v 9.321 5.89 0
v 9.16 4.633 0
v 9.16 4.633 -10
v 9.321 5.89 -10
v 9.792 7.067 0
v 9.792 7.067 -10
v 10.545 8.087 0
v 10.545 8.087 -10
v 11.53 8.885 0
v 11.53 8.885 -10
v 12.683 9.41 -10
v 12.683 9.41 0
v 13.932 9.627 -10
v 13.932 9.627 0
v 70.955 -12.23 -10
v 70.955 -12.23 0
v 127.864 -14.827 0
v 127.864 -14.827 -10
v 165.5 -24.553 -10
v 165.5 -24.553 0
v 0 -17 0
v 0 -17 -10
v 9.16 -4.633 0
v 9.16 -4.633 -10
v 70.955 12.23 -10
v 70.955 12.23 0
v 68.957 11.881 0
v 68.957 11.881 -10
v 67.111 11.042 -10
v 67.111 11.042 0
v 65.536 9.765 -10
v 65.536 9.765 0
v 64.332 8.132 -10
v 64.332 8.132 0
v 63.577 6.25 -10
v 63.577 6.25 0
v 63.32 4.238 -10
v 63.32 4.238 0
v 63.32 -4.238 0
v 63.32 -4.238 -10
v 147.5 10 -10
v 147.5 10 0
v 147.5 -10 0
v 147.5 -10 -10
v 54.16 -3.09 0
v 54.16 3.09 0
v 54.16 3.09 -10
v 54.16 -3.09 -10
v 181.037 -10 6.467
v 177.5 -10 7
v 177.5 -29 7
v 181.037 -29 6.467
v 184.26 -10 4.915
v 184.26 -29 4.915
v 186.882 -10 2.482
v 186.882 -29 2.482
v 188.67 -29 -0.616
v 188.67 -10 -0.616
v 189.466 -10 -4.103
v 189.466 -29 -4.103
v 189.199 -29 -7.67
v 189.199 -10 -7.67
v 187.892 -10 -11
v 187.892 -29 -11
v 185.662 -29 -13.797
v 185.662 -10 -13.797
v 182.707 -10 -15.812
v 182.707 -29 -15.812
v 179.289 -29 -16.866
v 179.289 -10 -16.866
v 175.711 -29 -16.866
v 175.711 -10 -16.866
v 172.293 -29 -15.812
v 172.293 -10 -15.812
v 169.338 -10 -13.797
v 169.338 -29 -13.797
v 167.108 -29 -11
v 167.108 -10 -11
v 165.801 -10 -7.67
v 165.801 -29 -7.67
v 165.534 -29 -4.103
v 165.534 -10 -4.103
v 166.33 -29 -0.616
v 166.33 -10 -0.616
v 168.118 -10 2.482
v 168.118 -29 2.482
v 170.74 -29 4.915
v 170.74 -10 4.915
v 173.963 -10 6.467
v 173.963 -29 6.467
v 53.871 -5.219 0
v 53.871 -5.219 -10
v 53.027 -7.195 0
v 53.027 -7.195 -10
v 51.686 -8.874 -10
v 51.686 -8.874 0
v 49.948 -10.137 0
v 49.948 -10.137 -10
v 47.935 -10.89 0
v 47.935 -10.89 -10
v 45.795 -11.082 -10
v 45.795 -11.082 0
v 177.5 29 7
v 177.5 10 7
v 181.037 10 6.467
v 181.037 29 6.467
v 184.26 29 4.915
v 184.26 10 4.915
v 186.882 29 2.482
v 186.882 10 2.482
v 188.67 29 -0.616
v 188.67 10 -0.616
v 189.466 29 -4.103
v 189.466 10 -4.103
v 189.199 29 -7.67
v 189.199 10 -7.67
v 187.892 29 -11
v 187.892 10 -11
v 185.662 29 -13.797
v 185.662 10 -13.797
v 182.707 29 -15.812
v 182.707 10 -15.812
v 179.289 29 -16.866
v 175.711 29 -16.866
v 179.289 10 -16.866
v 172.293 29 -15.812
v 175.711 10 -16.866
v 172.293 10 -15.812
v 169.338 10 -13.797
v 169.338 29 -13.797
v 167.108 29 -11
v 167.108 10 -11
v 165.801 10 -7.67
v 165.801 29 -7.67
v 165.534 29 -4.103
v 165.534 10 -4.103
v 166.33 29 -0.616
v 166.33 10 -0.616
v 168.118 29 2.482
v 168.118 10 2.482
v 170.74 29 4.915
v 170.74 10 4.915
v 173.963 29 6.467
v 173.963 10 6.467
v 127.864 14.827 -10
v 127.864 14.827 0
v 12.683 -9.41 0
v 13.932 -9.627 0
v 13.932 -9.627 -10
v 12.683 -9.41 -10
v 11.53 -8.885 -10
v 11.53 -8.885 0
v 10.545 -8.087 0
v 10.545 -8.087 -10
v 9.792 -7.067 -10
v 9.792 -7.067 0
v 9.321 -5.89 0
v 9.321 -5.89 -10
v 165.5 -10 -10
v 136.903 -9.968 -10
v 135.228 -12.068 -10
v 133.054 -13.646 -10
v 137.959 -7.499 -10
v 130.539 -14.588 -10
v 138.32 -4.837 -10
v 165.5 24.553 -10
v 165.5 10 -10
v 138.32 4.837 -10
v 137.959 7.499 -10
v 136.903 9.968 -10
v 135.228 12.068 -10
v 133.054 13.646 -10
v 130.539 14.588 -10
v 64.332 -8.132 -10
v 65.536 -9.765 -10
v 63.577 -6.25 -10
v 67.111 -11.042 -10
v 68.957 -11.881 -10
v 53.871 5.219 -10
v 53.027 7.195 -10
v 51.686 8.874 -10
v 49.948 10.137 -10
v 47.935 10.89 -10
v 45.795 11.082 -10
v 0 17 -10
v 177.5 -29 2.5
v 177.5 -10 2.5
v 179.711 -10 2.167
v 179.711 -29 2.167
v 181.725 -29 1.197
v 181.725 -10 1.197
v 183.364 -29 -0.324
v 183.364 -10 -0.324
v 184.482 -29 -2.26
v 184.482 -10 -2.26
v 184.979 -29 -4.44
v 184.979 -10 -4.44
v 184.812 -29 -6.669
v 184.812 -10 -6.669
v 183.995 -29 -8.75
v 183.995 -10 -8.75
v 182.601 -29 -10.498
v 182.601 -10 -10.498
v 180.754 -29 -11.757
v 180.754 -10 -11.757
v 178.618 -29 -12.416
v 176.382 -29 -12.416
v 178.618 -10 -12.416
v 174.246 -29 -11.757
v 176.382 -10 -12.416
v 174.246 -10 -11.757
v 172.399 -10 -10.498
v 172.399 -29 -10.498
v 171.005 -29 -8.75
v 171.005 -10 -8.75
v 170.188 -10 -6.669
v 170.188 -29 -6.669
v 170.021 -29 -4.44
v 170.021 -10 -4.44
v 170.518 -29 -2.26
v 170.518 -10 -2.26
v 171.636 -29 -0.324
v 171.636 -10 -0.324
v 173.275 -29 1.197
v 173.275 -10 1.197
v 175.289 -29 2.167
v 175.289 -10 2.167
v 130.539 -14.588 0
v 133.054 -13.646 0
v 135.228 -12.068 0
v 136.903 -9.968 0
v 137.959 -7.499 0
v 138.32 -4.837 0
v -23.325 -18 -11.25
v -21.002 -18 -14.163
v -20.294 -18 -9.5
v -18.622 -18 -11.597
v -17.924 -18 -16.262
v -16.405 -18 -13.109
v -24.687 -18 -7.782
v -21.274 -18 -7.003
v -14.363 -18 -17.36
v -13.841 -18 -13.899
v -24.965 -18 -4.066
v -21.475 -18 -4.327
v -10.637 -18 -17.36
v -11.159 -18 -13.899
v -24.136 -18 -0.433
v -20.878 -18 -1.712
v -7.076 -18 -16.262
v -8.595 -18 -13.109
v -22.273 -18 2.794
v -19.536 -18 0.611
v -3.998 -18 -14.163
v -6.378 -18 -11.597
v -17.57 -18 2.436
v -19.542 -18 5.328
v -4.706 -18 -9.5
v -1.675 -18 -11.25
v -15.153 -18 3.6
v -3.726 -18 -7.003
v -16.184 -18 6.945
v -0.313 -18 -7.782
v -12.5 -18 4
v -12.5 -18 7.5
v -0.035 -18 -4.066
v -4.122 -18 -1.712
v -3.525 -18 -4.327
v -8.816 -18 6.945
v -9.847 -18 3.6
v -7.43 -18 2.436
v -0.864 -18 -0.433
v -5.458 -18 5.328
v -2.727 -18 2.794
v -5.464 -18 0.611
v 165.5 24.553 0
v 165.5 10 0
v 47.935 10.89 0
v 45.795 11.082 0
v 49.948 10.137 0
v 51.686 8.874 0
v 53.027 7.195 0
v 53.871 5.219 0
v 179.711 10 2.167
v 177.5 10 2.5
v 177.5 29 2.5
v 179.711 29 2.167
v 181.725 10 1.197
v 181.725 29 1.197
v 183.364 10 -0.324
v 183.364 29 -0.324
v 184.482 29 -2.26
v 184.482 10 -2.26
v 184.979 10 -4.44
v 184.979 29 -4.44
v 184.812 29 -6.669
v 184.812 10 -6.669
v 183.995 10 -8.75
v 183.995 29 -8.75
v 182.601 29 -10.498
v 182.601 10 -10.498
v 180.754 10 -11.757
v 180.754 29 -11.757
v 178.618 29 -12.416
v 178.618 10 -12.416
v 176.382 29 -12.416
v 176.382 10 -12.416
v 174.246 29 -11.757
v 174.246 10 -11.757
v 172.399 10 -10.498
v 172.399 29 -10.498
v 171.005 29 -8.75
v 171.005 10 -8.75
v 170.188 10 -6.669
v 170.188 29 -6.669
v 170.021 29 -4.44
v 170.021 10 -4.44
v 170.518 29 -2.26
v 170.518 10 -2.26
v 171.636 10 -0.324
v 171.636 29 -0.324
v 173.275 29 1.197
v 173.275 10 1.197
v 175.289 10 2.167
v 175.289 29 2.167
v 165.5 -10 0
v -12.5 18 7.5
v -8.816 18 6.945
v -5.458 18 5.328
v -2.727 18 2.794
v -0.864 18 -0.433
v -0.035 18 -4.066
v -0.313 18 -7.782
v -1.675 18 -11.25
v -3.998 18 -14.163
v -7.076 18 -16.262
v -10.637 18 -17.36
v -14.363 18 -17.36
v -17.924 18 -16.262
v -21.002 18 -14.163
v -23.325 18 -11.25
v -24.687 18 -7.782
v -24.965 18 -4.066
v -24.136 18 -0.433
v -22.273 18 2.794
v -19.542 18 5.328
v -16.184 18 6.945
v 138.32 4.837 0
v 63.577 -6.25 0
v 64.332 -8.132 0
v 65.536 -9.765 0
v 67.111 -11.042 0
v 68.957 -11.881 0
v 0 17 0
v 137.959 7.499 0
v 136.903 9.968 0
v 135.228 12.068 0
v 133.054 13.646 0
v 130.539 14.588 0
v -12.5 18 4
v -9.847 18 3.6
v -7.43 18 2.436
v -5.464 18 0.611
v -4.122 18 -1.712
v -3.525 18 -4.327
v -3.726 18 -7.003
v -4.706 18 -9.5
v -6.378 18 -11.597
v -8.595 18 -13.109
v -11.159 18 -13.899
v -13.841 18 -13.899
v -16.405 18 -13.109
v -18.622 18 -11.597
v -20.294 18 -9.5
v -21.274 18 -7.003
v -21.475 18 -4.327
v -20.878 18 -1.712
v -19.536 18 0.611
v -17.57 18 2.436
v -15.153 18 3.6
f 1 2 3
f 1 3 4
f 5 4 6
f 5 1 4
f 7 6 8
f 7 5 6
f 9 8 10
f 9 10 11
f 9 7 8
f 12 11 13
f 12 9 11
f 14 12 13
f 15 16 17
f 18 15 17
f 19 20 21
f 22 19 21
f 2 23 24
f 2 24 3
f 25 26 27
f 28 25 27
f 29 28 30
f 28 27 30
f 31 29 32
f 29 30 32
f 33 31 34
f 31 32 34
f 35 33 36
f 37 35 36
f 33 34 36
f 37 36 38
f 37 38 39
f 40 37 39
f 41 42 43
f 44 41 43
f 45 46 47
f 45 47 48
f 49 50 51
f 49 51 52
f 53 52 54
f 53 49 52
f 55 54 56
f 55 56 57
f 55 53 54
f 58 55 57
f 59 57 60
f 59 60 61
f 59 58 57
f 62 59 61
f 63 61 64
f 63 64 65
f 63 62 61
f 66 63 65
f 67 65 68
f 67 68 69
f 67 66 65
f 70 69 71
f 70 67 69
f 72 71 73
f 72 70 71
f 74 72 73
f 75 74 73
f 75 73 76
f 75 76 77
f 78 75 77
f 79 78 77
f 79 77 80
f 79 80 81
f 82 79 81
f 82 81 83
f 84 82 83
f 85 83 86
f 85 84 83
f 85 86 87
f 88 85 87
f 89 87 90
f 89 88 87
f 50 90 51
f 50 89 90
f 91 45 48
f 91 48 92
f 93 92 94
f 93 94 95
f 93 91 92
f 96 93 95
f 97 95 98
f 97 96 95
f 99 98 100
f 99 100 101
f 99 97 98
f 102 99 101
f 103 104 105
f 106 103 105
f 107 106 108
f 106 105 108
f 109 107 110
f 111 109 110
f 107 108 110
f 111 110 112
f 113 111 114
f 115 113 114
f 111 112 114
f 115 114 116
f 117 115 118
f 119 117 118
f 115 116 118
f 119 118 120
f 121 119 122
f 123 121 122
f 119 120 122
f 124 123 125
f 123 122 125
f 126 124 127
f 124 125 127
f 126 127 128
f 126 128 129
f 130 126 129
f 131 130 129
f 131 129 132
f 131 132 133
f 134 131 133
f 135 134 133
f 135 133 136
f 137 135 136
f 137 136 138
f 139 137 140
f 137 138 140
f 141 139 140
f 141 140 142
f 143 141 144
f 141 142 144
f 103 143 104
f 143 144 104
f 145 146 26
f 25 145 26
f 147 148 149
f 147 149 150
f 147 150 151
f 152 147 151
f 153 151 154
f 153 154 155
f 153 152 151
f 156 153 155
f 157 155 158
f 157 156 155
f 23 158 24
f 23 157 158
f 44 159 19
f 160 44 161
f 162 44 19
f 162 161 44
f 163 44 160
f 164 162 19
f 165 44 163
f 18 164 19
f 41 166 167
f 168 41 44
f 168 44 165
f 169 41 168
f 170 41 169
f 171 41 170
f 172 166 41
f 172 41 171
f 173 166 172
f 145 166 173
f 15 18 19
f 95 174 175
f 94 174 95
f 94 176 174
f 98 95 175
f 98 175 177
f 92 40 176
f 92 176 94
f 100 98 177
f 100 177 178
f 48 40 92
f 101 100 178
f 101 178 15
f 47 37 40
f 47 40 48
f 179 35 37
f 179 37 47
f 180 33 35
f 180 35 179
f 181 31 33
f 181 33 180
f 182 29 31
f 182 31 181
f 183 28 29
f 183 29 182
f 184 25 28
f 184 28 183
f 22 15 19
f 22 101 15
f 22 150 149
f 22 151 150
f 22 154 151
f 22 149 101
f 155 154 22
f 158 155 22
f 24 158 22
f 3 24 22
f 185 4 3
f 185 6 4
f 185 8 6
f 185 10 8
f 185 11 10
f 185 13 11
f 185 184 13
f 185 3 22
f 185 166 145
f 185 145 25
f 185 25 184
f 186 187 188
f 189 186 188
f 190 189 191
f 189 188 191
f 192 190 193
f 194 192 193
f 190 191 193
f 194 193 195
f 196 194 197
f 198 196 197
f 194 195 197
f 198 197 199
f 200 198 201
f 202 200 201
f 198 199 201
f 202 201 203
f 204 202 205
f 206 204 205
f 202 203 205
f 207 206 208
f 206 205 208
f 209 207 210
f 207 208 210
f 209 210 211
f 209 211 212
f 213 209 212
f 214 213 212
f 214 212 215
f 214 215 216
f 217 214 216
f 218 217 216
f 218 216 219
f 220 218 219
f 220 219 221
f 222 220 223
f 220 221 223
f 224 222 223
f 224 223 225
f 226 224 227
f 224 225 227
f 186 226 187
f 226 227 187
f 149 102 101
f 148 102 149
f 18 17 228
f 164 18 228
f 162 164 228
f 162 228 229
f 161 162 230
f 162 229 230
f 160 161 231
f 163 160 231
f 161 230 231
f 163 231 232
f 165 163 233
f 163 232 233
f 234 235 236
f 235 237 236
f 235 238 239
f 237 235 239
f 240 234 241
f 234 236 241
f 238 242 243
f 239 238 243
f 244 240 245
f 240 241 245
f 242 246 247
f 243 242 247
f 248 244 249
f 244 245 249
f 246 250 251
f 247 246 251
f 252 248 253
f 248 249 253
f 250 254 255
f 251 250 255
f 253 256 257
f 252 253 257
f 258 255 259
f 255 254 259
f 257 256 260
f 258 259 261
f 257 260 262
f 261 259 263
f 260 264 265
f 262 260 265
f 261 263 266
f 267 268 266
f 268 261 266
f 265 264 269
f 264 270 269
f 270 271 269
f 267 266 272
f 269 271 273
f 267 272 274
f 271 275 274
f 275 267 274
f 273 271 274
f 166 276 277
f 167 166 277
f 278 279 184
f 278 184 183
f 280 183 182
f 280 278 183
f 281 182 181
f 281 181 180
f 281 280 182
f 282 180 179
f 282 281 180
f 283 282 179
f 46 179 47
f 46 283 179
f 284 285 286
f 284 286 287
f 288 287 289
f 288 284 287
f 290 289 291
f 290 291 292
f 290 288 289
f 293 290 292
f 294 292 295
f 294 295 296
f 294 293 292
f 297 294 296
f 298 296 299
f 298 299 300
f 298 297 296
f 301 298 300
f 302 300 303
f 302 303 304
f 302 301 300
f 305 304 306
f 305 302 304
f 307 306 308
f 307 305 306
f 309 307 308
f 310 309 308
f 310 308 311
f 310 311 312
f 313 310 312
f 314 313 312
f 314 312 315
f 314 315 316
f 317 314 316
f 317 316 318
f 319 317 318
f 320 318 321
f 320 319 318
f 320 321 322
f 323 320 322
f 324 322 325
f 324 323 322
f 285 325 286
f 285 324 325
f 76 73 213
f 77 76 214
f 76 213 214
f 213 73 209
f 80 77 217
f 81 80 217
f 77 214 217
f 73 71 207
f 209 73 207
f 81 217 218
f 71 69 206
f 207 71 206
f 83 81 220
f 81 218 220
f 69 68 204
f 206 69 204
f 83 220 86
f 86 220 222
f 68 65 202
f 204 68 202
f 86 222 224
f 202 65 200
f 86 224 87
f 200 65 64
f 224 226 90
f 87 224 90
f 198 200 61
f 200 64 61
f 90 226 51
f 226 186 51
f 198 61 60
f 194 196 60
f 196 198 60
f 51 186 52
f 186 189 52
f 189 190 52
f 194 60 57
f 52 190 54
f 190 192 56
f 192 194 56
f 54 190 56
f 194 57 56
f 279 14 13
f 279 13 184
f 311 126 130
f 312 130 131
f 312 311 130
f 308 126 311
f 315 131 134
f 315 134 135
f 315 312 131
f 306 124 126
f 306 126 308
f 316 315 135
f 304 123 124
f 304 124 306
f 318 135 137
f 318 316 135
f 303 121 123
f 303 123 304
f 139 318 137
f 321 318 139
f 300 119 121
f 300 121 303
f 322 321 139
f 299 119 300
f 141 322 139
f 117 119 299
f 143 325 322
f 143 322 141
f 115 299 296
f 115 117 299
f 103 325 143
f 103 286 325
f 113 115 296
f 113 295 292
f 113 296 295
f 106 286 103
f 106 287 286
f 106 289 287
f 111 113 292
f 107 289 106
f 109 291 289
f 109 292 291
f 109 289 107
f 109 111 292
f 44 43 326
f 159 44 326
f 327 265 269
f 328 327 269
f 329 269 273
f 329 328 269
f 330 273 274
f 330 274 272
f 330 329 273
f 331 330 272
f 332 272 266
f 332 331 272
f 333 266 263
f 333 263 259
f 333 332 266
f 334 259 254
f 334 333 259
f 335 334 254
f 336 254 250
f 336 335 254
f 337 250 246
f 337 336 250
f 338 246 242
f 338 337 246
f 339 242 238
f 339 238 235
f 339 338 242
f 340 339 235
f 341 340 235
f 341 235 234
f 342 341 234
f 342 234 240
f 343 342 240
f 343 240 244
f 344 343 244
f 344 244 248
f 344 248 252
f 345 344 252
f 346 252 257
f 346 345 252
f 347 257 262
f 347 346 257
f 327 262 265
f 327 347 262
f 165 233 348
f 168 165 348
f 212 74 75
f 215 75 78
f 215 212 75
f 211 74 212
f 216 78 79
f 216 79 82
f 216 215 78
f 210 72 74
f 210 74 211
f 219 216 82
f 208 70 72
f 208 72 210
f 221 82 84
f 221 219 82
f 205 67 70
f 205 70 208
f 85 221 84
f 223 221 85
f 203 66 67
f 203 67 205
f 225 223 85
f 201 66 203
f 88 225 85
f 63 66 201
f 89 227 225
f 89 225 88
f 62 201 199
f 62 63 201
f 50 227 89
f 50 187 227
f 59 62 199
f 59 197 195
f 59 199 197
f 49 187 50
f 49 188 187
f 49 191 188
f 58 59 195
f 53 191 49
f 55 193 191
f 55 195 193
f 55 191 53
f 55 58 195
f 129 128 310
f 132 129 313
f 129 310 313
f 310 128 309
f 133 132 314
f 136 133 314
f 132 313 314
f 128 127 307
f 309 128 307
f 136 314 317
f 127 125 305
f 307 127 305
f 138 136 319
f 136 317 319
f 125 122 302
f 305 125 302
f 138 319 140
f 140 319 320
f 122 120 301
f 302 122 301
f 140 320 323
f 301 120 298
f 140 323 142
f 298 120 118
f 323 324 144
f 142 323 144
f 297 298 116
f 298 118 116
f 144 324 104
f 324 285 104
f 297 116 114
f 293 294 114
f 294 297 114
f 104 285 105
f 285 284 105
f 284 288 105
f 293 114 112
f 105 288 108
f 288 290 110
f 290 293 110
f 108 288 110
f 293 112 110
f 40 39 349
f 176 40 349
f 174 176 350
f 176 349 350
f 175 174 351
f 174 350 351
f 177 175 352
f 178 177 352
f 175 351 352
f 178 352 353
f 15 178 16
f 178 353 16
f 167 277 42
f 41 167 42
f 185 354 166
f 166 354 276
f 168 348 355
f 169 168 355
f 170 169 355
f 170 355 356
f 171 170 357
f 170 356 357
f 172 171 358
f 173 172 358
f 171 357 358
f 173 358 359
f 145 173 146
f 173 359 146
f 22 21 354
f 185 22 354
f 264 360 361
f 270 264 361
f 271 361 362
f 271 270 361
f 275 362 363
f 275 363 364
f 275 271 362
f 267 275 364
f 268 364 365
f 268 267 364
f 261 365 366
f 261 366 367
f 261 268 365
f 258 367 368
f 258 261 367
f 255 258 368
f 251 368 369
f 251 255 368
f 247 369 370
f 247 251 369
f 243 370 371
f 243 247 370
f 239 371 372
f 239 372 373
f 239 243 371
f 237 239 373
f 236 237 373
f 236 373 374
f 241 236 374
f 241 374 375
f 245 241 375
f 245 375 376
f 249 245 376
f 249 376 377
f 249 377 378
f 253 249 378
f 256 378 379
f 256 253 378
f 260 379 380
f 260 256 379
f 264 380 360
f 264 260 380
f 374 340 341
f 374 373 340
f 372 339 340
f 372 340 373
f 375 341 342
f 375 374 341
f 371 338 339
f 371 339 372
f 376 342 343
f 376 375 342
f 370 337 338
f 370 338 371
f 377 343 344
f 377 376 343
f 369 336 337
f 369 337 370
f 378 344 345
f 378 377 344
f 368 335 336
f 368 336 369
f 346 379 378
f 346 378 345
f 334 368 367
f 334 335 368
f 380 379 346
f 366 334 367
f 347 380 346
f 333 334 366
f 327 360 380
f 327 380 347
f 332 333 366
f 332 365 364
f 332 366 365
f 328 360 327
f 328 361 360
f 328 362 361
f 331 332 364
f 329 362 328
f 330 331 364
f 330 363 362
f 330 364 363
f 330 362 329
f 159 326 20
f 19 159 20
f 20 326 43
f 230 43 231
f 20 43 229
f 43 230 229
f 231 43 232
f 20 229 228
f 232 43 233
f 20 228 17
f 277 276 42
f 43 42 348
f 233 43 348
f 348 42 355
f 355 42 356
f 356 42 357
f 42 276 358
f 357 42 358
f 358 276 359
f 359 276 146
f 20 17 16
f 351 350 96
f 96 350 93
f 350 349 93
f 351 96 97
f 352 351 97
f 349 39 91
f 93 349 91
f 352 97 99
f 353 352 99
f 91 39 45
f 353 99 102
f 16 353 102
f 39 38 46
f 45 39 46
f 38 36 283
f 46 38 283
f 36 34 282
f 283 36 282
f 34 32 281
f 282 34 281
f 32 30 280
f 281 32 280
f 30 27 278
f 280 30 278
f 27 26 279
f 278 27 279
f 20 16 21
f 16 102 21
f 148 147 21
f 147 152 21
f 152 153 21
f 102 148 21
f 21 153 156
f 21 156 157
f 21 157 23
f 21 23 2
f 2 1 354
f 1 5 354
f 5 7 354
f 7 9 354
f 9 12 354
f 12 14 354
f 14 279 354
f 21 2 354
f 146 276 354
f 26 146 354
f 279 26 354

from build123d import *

# Parameters (mm, degrees)
BOSS_EXTRUDE1_DEPTH = 10
SKETCH2_R           = 12.5
SKETCH2_R_2         = 9
BOSS_EXTRUDE2_DEPTH = 18
SKETCH3_R           = 12
SKETCH3_R_2         = 7.5
BOSS_EXTRUDE3_DEPTH = 19


with BuildPart() as part:
    # Sketch1 → Boss-Extrude1 (new body)
    with BuildSketch(Plane.XY):
        Polygon((165.5, -24.552818182), (0, -17), (0, 17), (165.5, 24.552818182), (165.5, 10), (147.5, 10), (147.5, -10), (165.5, -10), align=None)
        with BuildLine():
            ThreePointArc((138.32, 4.837323832), (135.228006533, 12.067776497), (127.864110852, 14.826926681))
            Line((127.864110852, 14.826926681), (70.955288681, 12.229814978))
            ThreePointArc((70.955288681, 12.229814978), (65.535637868, 9.764537925), (63.32, 4.238132699))
            Line((63.32, 4.238132699), (63.32, -4.238132699))
            ThreePointArc((63.32, -4.238132699), (65.535637868, -9.764537925), (70.955288681, -12.229814978))
            Line((70.955288681, -12.229814978), (127.864110852, -14.826926681))
            ThreePointArc((127.864110852, -14.826926681), (135.228006533, -12.067776497), (138.32, -4.837323832))
            Line((138.32, -4.837323832), (138.32, 4.837323832))
        make_face(mode=Mode.SUBTRACT)
        with BuildLine():
            Line((9.16, 0), (9.16, 4.632680545))
            ThreePointArc((9.16, 4.632680545), (10.544773667, 8.086683812), (13.932055426, 9.62748197))
            Line((13.932055426, 9.62748197), (45.795288681, 11.081604069))
            ThreePointArc((45.795288681, 11.081604069), (51.686405226, 8.874283922), (54.16, 3.08992179))
            Line((54.16, 3.08992179), (54.16, -3.08992179))
            ThreePointArc((54.16, -3.08992179), (51.686405226, -8.874283922), (45.795288681, -11.081604069))
            Line((45.795288681, -11.081604069), (13.932055426, -9.62748197))
            ThreePointArc((13.932055426, -9.62748197), (10.544773667, -8.086683812), (9.16, -4.632680545))
            Line((9.16, -4.632680545), (9.16, 0))
        make_face(mode=Mode.SUBTRACT)
    extrude(amount=-BOSS_EXTRUDE1_DEPTH)


with BuildPart() as body_2:
    # Sketch2 → Boss-Extrude2 (new, symmetric)
    with BuildSketch(Plane(origin=(0, 0, 0), x_dir=(1, 0, 0), z_dir=(0, 1, 0))):
        with Locations(Location((-12.5, 5, 0), (0, 0, 270))):
            Circle(SKETCH2_R)
        with Locations(Location((-12.5, 5, 0), (0, 0, 270))):
            Circle(SKETCH2_R_2, mode=Mode.SUBTRACT)
    extrude(amount=BOSS_EXTRUDE2_DEPTH, both=True)


with BuildPart() as body_3:
    # Sketch3 → Boss-Extrude3 (new body)
    with BuildSketch(Plane(origin=(0, -10, 0), x_dir=(1, 0, 0), z_dir=(0, 1, 0))):
        with Locations(Location((177.5, 5, 0), (0, 0, 270))):
            Circle(SKETCH3_R)
        with Locations(Location((177.5, 5, 0), (0, 0, 270))):
            Circle(SKETCH3_R_2, mode=Mode.SUBTRACT)
    extrude(amount=-BOSS_EXTRUDE3_DEPTH)


with BuildPart() as body_4:
    # Mirror2: mirrored copy
    add(body_3.part.mirror(Plane.ZX))


solid = Compound([part.part, body_2.part, body_3.part, body_4.part])
